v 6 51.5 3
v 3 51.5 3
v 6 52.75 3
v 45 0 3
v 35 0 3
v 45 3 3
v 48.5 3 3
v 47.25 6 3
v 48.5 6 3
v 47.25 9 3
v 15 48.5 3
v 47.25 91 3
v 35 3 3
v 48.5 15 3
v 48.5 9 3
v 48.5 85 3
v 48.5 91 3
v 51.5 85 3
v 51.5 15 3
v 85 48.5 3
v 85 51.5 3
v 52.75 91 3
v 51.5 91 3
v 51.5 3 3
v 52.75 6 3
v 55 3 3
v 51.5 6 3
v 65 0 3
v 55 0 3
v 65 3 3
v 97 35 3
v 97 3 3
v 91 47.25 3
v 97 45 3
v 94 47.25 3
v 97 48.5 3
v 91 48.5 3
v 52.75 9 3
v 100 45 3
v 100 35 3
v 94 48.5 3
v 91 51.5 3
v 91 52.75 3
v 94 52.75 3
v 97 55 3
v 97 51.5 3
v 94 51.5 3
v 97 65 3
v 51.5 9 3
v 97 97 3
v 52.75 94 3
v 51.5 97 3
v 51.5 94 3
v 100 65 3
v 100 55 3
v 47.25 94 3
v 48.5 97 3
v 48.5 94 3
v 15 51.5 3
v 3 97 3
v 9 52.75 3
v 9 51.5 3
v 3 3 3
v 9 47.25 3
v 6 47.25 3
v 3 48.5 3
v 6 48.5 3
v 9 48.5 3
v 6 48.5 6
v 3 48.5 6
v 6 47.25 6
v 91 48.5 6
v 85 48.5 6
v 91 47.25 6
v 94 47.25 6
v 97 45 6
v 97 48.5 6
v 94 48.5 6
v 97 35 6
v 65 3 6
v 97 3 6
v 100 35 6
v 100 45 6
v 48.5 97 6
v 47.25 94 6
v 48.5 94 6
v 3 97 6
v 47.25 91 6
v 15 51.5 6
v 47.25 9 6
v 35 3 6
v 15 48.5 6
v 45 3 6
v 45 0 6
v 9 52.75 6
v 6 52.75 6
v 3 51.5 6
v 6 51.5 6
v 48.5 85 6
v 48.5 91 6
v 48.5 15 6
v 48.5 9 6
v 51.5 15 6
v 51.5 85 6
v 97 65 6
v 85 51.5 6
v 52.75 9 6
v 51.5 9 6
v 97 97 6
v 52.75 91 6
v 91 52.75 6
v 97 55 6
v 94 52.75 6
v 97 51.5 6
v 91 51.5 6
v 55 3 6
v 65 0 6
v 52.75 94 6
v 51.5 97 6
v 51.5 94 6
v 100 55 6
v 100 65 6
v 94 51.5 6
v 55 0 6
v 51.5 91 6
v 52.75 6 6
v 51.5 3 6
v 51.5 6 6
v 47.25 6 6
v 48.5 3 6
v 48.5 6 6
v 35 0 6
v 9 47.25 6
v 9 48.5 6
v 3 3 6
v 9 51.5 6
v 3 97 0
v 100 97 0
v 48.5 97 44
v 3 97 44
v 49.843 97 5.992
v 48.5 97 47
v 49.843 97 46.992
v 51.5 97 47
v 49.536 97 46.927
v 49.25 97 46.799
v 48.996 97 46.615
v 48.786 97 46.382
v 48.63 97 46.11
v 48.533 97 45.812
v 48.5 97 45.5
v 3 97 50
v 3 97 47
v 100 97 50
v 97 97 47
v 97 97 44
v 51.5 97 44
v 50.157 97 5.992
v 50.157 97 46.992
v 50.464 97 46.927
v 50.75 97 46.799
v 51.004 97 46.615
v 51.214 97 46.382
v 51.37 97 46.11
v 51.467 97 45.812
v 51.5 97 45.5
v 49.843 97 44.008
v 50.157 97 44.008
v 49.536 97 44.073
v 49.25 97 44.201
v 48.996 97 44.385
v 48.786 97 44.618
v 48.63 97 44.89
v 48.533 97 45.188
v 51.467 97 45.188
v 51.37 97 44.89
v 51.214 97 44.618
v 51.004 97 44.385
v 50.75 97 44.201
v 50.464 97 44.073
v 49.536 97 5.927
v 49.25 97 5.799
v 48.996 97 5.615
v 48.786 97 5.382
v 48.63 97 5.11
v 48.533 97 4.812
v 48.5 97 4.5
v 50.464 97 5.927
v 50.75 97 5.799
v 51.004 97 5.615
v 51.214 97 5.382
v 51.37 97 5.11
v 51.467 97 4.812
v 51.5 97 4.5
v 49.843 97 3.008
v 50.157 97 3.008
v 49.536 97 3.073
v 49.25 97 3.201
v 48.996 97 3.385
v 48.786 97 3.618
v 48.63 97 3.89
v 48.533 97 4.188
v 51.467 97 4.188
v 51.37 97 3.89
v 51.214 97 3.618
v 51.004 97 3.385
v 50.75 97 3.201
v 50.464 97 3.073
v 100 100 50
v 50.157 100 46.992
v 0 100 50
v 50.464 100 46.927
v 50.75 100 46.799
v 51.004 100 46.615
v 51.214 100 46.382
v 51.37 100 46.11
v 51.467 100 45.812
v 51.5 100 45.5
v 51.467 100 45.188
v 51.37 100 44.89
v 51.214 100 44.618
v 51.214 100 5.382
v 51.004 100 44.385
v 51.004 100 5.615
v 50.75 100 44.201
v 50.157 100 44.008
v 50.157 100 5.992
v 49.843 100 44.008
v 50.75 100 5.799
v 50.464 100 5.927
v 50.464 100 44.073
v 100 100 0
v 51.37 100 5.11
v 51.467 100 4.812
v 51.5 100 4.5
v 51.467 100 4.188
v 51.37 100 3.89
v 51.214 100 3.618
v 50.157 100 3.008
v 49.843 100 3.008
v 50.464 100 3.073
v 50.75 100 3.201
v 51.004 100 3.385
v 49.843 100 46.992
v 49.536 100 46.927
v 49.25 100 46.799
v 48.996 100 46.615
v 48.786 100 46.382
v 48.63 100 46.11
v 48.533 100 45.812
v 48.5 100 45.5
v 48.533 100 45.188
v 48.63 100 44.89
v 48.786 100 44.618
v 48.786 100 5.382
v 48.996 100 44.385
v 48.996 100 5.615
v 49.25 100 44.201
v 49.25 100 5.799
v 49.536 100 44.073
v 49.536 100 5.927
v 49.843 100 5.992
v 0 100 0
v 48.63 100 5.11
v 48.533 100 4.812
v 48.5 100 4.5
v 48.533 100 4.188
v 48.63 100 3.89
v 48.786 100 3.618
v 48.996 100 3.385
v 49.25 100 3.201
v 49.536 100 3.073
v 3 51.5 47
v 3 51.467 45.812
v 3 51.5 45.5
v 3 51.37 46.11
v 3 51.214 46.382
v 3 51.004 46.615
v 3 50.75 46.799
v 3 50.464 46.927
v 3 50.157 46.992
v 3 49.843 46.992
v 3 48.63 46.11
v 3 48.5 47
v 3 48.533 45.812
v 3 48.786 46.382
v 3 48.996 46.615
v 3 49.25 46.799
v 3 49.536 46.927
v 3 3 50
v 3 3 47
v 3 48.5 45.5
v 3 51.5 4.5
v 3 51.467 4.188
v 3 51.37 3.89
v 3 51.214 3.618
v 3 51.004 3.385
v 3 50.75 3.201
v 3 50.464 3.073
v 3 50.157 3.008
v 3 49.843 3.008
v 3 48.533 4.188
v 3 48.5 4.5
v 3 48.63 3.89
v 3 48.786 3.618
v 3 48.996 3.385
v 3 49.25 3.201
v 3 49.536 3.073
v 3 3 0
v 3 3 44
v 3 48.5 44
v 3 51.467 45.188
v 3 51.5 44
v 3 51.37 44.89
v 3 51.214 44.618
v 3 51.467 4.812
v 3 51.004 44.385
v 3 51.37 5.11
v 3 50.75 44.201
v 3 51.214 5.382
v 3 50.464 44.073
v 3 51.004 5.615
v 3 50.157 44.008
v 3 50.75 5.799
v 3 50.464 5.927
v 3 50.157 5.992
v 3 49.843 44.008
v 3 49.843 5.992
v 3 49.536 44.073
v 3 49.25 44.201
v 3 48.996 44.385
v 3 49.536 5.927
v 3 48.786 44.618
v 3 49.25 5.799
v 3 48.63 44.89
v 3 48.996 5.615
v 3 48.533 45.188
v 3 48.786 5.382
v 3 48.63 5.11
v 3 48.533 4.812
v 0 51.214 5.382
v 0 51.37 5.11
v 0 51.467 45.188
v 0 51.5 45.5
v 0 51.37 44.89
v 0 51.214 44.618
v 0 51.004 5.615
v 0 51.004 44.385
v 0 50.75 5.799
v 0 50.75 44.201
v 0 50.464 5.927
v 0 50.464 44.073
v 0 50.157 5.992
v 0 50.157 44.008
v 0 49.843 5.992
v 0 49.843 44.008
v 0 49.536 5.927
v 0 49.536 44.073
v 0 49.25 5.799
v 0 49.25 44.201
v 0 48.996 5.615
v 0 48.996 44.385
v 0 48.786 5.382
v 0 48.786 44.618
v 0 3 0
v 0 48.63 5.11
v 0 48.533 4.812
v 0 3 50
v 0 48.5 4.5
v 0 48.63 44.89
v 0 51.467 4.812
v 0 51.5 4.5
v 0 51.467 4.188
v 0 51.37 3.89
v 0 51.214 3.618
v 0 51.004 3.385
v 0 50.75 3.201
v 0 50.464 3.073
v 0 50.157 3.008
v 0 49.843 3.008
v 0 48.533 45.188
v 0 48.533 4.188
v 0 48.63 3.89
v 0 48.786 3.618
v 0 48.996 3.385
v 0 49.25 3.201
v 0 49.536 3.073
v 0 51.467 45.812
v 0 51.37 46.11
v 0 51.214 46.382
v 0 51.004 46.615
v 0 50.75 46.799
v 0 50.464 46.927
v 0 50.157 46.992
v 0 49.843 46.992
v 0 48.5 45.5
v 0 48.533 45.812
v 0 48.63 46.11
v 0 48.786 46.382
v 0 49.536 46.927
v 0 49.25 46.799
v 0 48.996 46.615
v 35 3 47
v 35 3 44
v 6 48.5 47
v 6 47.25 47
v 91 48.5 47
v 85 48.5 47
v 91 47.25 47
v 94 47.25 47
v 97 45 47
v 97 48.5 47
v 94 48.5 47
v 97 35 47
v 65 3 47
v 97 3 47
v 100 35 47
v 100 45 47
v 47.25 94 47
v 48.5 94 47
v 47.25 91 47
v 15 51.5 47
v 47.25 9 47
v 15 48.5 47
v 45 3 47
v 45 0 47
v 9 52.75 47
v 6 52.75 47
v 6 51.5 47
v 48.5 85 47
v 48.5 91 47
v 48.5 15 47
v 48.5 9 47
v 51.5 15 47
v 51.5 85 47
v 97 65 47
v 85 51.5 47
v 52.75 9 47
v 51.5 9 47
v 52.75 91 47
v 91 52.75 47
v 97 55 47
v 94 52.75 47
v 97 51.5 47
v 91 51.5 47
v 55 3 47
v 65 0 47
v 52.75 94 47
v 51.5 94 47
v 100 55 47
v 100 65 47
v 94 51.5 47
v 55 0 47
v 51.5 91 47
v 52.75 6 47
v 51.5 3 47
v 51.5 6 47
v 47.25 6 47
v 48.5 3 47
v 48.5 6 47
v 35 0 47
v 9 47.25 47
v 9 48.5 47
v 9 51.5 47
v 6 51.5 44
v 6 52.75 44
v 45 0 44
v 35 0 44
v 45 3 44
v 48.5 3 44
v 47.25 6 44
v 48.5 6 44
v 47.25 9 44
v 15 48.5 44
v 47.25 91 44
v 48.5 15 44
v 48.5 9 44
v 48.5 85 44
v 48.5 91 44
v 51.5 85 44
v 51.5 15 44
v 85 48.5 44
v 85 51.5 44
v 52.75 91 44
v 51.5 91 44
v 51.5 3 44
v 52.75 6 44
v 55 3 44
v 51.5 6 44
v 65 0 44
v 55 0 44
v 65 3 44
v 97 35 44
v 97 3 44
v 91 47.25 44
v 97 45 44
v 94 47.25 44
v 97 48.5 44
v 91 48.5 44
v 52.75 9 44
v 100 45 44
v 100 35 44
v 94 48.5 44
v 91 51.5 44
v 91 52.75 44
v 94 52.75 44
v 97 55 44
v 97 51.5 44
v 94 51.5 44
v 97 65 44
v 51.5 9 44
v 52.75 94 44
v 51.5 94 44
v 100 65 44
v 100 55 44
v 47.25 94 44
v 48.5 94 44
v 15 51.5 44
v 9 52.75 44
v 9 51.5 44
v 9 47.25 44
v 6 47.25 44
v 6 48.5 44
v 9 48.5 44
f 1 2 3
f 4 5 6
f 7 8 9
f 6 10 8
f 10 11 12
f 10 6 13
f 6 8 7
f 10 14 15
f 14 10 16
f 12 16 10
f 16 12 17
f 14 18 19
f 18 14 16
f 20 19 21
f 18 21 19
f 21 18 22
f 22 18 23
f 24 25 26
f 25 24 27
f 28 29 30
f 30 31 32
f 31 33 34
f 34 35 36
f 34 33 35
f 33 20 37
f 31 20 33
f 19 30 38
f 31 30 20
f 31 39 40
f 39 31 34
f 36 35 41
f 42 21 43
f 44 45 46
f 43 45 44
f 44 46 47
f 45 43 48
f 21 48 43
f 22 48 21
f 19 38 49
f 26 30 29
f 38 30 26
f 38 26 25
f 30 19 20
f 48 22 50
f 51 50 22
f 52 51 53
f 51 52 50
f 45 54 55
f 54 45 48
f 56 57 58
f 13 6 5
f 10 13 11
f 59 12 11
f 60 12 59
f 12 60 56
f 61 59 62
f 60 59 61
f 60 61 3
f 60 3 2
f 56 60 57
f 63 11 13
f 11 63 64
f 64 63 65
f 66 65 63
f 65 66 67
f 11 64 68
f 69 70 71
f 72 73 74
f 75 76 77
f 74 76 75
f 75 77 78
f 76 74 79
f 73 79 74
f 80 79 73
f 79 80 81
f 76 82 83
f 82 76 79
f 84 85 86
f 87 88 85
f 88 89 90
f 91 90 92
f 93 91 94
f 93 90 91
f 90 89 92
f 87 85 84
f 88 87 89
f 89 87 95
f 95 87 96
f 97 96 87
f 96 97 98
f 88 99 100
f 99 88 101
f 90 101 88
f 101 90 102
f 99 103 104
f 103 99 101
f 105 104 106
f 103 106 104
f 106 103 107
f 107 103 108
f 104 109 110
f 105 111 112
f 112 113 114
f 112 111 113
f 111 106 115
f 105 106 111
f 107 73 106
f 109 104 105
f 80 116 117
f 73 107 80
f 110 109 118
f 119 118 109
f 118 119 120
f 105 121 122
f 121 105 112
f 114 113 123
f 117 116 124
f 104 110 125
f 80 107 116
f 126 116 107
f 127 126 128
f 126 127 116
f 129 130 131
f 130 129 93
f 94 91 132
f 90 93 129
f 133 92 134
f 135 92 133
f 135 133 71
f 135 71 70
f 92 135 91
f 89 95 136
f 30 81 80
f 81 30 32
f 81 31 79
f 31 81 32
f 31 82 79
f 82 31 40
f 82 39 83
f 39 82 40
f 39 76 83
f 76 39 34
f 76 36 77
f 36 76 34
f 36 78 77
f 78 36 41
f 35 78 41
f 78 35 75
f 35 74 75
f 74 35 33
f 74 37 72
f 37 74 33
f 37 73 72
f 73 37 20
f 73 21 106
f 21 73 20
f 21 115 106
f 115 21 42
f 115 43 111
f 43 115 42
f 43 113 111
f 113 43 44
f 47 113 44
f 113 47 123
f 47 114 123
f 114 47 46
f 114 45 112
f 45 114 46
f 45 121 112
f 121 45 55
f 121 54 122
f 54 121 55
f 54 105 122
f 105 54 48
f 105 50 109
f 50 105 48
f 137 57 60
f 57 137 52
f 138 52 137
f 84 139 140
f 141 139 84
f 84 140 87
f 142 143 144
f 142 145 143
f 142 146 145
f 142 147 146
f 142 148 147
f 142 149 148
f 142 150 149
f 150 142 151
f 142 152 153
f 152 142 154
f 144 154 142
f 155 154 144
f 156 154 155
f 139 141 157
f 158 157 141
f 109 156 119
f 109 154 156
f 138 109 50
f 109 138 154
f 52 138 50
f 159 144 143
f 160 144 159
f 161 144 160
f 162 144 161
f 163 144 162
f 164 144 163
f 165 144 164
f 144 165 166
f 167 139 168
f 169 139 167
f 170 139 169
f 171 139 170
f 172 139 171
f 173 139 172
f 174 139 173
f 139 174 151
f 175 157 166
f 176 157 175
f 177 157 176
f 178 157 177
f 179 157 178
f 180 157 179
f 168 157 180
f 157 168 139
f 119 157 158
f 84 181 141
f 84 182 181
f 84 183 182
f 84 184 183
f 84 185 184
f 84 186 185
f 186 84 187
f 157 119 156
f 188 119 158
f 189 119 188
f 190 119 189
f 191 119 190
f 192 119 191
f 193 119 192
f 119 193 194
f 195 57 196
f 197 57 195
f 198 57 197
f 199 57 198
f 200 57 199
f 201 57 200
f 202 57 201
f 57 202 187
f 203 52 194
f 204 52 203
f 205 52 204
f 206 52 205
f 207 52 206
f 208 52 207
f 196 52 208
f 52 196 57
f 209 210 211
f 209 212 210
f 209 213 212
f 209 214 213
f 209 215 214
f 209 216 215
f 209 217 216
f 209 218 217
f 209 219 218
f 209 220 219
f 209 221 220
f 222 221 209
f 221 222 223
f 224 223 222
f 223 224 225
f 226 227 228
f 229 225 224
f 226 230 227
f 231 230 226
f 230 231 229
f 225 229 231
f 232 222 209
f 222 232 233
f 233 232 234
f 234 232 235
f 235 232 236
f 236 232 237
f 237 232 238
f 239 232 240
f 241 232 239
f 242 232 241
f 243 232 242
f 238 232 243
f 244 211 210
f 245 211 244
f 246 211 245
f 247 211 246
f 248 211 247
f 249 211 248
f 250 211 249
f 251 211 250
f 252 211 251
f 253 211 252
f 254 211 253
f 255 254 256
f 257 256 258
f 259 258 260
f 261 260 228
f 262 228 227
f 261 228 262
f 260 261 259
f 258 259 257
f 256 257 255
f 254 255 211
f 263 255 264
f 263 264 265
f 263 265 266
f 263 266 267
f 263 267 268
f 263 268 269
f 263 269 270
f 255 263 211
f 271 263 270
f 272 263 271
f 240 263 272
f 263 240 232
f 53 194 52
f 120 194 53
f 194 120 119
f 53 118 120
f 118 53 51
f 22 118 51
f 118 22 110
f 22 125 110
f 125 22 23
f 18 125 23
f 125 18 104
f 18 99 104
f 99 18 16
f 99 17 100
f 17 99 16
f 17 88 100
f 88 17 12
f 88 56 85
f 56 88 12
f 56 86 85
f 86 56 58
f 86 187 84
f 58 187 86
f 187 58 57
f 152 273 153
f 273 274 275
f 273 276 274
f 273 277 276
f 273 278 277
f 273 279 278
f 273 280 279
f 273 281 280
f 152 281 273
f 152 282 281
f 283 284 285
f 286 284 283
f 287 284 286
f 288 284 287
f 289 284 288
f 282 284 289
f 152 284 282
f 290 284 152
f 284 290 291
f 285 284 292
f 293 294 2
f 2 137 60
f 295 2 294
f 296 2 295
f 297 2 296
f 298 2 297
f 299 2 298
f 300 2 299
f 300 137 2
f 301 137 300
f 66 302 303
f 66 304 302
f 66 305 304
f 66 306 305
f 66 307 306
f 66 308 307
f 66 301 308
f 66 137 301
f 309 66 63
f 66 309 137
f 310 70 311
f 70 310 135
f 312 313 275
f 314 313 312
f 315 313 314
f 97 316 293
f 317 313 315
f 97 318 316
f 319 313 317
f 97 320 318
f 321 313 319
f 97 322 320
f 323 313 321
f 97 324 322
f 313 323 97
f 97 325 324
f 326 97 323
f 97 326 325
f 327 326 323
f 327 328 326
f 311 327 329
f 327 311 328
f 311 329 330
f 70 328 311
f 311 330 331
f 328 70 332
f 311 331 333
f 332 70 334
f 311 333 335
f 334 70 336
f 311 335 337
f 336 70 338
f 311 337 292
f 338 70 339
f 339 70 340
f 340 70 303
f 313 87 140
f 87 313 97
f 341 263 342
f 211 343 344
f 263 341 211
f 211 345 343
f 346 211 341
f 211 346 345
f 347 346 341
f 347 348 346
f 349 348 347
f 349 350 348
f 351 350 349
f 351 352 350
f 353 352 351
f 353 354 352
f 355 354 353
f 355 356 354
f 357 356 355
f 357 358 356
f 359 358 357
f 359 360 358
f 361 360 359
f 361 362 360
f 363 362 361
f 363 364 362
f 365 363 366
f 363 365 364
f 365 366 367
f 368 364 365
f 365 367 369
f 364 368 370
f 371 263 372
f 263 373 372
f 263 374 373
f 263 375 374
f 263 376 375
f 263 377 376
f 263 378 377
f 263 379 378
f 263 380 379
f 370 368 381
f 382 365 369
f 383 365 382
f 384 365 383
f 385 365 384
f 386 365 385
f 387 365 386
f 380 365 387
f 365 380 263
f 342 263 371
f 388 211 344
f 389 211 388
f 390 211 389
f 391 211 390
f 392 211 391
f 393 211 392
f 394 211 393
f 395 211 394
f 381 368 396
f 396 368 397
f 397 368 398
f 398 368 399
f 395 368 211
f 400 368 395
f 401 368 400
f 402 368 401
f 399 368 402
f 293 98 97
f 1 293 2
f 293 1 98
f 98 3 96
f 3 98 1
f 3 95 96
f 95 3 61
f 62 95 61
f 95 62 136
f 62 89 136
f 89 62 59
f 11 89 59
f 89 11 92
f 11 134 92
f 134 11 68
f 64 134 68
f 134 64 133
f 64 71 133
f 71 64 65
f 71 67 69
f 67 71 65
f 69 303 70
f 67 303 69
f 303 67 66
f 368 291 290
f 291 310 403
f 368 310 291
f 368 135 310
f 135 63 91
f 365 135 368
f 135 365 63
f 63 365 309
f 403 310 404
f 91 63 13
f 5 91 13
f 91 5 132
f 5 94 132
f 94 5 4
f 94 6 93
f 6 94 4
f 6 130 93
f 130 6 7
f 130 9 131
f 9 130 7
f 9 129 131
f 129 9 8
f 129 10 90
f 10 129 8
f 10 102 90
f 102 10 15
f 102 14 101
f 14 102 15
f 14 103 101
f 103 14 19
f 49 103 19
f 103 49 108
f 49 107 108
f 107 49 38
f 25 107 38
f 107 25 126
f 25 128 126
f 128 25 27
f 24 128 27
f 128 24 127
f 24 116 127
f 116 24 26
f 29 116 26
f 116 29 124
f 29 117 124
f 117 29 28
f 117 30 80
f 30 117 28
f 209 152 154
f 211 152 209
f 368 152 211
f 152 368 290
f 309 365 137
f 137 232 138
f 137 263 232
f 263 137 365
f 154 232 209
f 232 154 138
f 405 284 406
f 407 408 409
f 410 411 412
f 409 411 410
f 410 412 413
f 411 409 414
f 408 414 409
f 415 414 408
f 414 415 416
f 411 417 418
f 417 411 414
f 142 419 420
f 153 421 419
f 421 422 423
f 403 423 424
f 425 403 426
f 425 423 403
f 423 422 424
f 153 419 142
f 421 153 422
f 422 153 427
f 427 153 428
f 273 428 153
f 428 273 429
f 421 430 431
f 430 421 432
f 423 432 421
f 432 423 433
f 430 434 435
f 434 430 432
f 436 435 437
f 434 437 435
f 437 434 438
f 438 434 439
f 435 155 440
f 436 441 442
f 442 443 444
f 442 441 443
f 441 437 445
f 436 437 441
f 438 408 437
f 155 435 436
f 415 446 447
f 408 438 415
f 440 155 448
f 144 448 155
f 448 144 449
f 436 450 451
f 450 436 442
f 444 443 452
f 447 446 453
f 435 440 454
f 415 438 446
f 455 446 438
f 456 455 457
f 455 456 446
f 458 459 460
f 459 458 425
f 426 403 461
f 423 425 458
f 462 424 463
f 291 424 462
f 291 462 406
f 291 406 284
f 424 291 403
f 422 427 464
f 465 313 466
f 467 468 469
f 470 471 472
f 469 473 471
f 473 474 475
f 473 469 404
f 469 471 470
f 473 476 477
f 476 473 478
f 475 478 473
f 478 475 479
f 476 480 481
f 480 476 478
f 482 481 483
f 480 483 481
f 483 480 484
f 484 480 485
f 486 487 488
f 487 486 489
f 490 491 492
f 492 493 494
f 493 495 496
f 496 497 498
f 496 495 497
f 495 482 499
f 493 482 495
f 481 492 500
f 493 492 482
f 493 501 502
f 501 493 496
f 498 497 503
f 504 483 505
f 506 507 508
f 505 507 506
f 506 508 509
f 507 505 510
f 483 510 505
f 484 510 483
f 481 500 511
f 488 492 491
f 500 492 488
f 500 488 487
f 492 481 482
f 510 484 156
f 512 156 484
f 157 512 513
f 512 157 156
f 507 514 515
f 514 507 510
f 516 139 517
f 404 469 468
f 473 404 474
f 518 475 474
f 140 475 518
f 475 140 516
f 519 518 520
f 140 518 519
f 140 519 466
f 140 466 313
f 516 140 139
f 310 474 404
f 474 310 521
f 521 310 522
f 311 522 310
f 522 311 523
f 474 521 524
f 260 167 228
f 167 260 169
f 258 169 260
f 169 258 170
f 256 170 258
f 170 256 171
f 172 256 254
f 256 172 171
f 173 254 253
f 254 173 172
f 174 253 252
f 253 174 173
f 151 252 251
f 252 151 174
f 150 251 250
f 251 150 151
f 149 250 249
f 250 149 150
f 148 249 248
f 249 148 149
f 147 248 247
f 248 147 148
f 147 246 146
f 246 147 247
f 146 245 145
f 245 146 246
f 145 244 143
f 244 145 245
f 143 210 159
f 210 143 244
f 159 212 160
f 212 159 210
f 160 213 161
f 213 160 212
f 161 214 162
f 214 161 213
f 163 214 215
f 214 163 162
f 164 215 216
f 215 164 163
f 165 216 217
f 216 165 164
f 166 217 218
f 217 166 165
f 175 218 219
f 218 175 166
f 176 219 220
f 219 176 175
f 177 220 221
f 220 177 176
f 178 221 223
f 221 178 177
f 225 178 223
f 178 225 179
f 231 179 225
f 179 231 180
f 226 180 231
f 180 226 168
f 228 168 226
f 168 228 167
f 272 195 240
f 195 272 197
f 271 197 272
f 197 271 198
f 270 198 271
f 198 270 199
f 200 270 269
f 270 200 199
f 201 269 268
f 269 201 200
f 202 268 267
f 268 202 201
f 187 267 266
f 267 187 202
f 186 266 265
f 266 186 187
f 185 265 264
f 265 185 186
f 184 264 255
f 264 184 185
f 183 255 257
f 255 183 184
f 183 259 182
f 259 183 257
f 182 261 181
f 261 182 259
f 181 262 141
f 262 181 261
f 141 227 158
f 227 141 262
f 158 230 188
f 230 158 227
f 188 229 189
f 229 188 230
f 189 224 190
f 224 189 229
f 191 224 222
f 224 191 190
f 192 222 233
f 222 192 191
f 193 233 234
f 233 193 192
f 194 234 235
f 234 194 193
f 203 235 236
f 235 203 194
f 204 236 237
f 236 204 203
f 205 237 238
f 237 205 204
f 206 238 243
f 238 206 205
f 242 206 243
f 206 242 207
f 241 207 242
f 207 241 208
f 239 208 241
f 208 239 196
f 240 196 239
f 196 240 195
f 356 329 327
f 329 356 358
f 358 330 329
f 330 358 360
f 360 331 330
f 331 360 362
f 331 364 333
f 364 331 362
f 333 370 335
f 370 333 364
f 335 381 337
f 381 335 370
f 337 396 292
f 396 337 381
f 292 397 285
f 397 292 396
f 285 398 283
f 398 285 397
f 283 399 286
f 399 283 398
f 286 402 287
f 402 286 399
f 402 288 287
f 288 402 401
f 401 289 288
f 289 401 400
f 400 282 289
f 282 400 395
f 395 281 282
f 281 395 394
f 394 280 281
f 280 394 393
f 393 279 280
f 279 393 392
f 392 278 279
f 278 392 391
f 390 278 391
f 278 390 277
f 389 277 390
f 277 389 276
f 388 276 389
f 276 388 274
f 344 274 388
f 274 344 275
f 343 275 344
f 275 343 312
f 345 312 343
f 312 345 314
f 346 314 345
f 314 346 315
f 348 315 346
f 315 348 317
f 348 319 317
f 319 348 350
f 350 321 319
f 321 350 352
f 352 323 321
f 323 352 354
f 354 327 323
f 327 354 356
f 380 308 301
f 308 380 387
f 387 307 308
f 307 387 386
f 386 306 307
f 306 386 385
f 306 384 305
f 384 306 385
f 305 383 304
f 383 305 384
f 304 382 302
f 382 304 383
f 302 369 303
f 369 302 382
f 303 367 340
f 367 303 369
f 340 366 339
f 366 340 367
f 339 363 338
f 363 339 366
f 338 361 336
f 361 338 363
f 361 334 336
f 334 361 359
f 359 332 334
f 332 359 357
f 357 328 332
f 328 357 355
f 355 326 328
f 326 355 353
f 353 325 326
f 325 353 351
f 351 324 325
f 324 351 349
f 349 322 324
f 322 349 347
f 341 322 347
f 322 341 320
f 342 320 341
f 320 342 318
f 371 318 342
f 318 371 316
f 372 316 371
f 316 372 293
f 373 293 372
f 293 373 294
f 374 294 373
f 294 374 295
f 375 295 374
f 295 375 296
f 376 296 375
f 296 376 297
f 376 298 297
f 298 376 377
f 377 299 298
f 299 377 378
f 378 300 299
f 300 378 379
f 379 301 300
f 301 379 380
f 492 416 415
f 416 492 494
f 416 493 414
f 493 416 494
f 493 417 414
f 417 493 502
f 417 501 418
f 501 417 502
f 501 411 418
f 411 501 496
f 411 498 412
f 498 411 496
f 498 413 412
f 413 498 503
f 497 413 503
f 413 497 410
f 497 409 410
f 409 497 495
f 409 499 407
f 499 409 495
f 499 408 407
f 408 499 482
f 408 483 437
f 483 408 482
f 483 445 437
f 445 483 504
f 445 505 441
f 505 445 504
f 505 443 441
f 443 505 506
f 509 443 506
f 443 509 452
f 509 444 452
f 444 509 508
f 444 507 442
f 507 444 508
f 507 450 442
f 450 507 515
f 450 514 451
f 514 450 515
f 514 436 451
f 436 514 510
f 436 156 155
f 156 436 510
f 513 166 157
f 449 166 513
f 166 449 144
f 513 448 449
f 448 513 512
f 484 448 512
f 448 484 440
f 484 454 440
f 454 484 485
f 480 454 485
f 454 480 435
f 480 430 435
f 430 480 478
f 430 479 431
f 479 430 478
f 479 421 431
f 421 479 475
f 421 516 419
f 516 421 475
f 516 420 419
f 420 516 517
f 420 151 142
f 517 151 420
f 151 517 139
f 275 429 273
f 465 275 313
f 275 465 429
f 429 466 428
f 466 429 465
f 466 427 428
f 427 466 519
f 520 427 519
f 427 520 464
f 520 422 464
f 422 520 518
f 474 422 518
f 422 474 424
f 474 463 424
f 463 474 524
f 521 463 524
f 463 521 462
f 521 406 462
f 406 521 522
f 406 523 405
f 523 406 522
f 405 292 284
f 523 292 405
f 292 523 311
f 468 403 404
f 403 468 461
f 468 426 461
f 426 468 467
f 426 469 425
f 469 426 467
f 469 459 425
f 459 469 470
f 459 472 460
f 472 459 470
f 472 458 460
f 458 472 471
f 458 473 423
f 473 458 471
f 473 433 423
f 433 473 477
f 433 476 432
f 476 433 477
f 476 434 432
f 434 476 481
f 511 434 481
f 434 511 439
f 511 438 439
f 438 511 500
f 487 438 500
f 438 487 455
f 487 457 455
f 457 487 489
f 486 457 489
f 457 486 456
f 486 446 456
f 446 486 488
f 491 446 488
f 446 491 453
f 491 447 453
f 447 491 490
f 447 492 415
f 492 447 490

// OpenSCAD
// Based on http://www.thingiverse.com/thing:27452/

width = 100;
height = 50;
depth = 100;
materialThickness = 3;
offset = 0; // for lasercutter beam width

boltWidth = 3;
boltLength = 15;
nutWidth = 5.5;
nutHeight = 3;
spaceAroundBolt = 10;
plugWidth = 30;
plugHeight = materialThickness;

f = 1; // fix for overlapping edges issue
c = 30; //cornerResolution ($fn)
s = 1;//seperator dis.

// ungly, but we can't add to variables since they are calculated compile time
width2 = width+offset*2;
height2 = height+offset*2;
depth2 = depth+offset*2;
plugWidth2 = plugWidth+offset*2;
plugHeight2 = plugHeight+offset;
holeWidth2 = plugWidth-offset*2;
holeHeight2 = plugHeight-offset*2;

boltWidth2 = boltWidth-offset*2;
boltLength2 = boltLength-offset;
nutWidth2 = nutWidth-offset*2;
nutHeight2 = nutHeight-offset*2;
spaceAroundBolt2 = spaceAroundBolt-offset*2;


//export();
assembly3D();

module export()
{
	bottom();
	translate([width2+s,0,0]) top();

	translate([0,depth2+s,0]) front();
	translate([width2+s,depth2+s,0]) back();

	translate([0,depth2+s+height2+s,0]) left();
	translate([depth2-materialThickness*2+s,depth2+s+height2+s,0]) right();
}
module assembly3D()
{
	translate([0,0,materialThickness*1.5]) wood() bottom();
	//translate([0,materialThickness/2,0]) rotate([90,0,0]) wood() front();
	translate([0,depth2-materialThickness/2,0]) rotate([90,0,0]) wood() back();
	translate([materialThickness/2,materialThickness,0]) rotate([90,0,90]) wood() left();
	//translate([width2-materialThickness/2,materialThickness,0]) rotate([90,0,90]) wood() right();

	translate([0,0,height2-materialThickness*1.5-offset]) wood() top();
}

module bottom()
{
	difference()
	{
		union()
		{
			//TODO: incorporate f
			translate([plugHeight2,plugHeight2,0]) 	
				square([width2-plugHeight2*2,depth2-plugHeight2*2]);
		
			translate([width2/2,0,0]) plug();
			translate([width2/2,depth2,0]) 
				rotate([0,0,180]) plug();

			translate([0,depth2/2,0]) 
				rotate([0,0,-90]) plug();
			translate([width2,depth2/2,0]) 
				rotate([0,0,90]) plug();
		}
		translate([width2/2,0,0]) boltCutOut1();
		translate([width2/2,depth2,0]) 
			rotate([0,0,180]) boltCutOut1();
		translate([width2,depth/2,0]) rotate([0,0,90]) boltCutOut1();
		translate([0,depth/2,0]) rotate([0,0,-90]) boltCutOut1();
	}
}
module top()
{
	bottom();
}
module front()
{
	difference()
	{
		square([width2,height2]);
//width2/2-plugWidth2/2,materialThickness+offset
		translate([width2/2-holeWidth2/2,materialThickness+offset,0]) hole();
		translate([width2/2-holeWidth2/2,height-materialThickness-offset-holeHeight2,0]) hole();

		*translate([materialThickness+holeHeight2,height2/2-holeWidth2/2,0]) rotate([0,0,90]) hole();
		*translate([width2-materialThickness,height2/2-holeWidth2/2,0]) rotate([0,0,90]) hole();
	}
}
module back()
{
	front();
}
module left()
{
	width = depth2-materialThickness*2;
	height = height2;
	difference()
	{
		translate([0,0]) square([width,height]);
		translate([width/2-holeWidth2/2,materialThickness+offset,0]) hole();
		translate([width/2-holeWidth2/2,height-materialThickness-offset-holeHeight2,0]) hole();

		*translate([holeHeight2,height2/2-holeWidth2/2,0]) rotate([0,0,90]) hole();
		*translate([width-materialThickness,height2/2-holeWidth2/2,0]) rotate([0,0,90]) hole();
	}
}
module right()
{
	left();
}
module plug()
{
	translate([-plugWidth2/2,0,0]) square([plugWidth2,plugHeight2+f]);
}
module boltCutOut1()
{
	union()
	{
		translate([-spaceAroundBolt2/2,-f,0]) 
			square([spaceAroundBolt2,plugHeight2+f]);
		translate([-nutWidth2/2,plugHeight2+materialThickness,0]) 
			square([nutWidth2,nutHeight2]);
		translate([-boltWidth2/2,0,0]) 
			square([boltWidth2,boltLength2]);
	}
}
module hole()
{
	difference()
	{
		square([holeWidth2,holeHeight2]);
		translate([holeWidth2/2-spaceAroundBolt/2-offset,0,0]) 
			square([spaceAroundBolt+offset*2,holeHeight2]);
	}
	translate([holeWidth2/2,holeHeight2/2,0]) circle(r=boltWidth2/2,$fn=c);
}
module boltCutOut2()
{
	union()
	{
		translate([-spaceAroundBolt2/2,-f,0]) 
			square([spaceAroundBolt2,plugHeight2+f]);
		translate([-nutWidth2/2,plugHeight2+materialThickness,0]) 
			square([nutWidth2,nutHeight2]);
		translate([-boltWidth2/2,0,0]) 
			square([boltWidth2,boltLength2]);
	}
}
/////////////// utils ///////////////
module wood(alpha=1)
{
	h = materialThickness;
	color("BurlyWood",alpha) linear_extrude(height=h,convexity=c,center=true) for (i = [0 : $children-1]) children(i);
}
module mirrored(offset=0)
{
	translate([ offset/2, 0, 0]) for (i = [0 : $children-1]) children(i);
	translate([-offset/2, 0, 0]) scale([-1,1,1]) for (i = [0 : $children-1]) children(i);
}
module toiletRoll() {
	color("White")
	{
		difference() {
			cylinder(h = toiletRollHeigth, r=toiletRollRadius,$fn=c);
			translate([0,0,-f]) cylinder(h = toiletRollHeigth+f*2, r=toiletRollInnerRadius,$fn=c);
		}
	}	
}
